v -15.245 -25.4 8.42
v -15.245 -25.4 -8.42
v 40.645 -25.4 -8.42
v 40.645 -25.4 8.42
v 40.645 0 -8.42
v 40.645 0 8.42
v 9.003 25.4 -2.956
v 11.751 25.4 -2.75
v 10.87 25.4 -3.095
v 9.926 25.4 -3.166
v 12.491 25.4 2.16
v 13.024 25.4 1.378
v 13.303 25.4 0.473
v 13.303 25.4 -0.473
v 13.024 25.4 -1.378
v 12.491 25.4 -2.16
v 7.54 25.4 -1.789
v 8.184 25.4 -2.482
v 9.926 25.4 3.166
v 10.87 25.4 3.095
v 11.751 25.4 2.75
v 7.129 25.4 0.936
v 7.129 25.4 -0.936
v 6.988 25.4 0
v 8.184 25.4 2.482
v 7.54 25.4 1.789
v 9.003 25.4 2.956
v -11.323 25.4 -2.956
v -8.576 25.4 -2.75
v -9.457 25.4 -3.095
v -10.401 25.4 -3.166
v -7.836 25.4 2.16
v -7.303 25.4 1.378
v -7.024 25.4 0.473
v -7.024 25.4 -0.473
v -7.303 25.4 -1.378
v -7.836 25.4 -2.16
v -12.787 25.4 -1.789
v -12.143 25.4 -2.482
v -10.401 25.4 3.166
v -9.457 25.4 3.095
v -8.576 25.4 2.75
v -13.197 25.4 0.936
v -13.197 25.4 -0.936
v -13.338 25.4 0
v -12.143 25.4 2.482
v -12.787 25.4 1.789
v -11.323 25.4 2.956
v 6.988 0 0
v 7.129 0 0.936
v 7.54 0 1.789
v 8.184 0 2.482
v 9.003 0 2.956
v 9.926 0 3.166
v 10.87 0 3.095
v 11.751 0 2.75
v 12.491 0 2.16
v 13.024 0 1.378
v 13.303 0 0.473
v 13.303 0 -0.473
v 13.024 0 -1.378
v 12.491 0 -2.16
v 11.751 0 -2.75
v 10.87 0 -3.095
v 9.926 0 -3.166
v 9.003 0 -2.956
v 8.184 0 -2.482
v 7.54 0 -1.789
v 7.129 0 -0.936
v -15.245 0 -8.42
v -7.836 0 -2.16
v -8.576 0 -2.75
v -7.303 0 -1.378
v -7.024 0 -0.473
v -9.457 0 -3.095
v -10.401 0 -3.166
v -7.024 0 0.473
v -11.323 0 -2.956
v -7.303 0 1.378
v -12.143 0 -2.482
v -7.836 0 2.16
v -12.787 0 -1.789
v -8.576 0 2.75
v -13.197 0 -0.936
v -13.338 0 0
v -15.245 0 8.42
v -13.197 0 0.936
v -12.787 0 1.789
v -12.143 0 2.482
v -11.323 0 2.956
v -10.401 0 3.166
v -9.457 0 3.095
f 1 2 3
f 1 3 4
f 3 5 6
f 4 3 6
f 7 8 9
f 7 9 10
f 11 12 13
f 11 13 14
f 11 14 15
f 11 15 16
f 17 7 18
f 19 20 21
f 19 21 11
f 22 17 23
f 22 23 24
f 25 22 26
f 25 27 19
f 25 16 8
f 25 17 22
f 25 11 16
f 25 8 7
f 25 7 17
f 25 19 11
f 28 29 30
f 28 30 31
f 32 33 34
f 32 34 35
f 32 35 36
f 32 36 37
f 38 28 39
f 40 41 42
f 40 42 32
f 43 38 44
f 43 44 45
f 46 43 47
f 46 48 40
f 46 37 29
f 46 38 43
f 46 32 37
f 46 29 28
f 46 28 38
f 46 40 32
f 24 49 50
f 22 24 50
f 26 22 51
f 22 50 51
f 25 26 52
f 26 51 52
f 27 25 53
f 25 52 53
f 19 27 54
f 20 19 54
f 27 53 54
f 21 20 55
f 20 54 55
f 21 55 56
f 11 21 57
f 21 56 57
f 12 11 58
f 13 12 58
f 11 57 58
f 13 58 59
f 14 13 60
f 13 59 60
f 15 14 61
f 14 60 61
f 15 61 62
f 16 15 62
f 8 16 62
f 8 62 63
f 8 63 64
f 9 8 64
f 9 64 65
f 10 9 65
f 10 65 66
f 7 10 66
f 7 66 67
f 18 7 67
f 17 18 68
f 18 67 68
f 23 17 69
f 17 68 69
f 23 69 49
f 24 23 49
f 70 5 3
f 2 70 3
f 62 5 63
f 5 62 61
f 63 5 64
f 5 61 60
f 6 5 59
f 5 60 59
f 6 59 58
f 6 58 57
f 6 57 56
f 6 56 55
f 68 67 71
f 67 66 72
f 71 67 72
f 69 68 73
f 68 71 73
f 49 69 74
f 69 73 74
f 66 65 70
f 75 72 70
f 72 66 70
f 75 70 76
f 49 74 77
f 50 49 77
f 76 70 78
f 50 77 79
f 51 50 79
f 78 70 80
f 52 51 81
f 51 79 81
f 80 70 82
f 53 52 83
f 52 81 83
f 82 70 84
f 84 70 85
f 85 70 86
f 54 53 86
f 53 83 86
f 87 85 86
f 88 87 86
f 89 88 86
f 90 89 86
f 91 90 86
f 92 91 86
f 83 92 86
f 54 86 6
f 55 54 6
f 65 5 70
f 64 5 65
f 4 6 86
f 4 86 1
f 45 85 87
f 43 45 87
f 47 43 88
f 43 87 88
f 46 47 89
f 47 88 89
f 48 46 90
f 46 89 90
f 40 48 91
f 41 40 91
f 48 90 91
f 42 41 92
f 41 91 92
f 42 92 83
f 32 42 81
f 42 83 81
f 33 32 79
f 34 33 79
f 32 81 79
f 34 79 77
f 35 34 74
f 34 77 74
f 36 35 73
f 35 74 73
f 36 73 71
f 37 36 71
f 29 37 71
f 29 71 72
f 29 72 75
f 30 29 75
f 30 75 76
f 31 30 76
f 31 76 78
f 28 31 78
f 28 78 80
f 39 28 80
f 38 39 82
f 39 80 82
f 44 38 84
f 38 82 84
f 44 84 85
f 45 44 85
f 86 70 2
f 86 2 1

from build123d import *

# Parameters (mm, degrees)
F0_W     = 30.4900507075
F0_H     = 16.8403594638
F0_R     = 3.175
F1_DEPTH = 25.4
F2_R     = 3.175
F3_DEPTH = 25.4
F4_DEPTH = 25.4


# Not quite as in the source:
# - a feature names something its author has since deleted; it is built from what else it names


with BuildPart() as f1:
    # F0 (on Front) → F1 (new body)
    with BuildSketch(Plane.XZ):
        Rectangle(F0_W, F0_H)
        with Locations((-7.6225126769, 0)):
            Circle(F0_R, mode=Mode.SUBTRACT)
        with Locations((7.6225126769, 0)):
            Circle(F0_R, mode=Mode.SUBTRACT)
        with Locations((-7.6225126769, 0)):
            Circle(F0_R)
        with Locations((7.6225126769, 0)):
            Circle(F0_R)
    extrude(amount=F1_DEPTH)

    # F2 (on face) → F3 (join)
    with BuildSketch(Plane(origin=(0, 0, 0), x_dir=(-1, 0, 0), z_dir=(0, 1, 0))):
        with Locations((10.1633502358, 0)):
            Circle(F2_R)
        with Locations((-10.1633502358, 0)):
            Circle(F2_R)
    extrude(amount=F3_DEPTH)

    # F4 (add): a face of the model
    f4_faces = [f1.faces().sort_by_distance(p)[0] for p in [
        (15.2450253537, -12.7, 0),
    ]]
    extrude(f4_faces, amount=F4_DEPTH)


solid = f1.part
